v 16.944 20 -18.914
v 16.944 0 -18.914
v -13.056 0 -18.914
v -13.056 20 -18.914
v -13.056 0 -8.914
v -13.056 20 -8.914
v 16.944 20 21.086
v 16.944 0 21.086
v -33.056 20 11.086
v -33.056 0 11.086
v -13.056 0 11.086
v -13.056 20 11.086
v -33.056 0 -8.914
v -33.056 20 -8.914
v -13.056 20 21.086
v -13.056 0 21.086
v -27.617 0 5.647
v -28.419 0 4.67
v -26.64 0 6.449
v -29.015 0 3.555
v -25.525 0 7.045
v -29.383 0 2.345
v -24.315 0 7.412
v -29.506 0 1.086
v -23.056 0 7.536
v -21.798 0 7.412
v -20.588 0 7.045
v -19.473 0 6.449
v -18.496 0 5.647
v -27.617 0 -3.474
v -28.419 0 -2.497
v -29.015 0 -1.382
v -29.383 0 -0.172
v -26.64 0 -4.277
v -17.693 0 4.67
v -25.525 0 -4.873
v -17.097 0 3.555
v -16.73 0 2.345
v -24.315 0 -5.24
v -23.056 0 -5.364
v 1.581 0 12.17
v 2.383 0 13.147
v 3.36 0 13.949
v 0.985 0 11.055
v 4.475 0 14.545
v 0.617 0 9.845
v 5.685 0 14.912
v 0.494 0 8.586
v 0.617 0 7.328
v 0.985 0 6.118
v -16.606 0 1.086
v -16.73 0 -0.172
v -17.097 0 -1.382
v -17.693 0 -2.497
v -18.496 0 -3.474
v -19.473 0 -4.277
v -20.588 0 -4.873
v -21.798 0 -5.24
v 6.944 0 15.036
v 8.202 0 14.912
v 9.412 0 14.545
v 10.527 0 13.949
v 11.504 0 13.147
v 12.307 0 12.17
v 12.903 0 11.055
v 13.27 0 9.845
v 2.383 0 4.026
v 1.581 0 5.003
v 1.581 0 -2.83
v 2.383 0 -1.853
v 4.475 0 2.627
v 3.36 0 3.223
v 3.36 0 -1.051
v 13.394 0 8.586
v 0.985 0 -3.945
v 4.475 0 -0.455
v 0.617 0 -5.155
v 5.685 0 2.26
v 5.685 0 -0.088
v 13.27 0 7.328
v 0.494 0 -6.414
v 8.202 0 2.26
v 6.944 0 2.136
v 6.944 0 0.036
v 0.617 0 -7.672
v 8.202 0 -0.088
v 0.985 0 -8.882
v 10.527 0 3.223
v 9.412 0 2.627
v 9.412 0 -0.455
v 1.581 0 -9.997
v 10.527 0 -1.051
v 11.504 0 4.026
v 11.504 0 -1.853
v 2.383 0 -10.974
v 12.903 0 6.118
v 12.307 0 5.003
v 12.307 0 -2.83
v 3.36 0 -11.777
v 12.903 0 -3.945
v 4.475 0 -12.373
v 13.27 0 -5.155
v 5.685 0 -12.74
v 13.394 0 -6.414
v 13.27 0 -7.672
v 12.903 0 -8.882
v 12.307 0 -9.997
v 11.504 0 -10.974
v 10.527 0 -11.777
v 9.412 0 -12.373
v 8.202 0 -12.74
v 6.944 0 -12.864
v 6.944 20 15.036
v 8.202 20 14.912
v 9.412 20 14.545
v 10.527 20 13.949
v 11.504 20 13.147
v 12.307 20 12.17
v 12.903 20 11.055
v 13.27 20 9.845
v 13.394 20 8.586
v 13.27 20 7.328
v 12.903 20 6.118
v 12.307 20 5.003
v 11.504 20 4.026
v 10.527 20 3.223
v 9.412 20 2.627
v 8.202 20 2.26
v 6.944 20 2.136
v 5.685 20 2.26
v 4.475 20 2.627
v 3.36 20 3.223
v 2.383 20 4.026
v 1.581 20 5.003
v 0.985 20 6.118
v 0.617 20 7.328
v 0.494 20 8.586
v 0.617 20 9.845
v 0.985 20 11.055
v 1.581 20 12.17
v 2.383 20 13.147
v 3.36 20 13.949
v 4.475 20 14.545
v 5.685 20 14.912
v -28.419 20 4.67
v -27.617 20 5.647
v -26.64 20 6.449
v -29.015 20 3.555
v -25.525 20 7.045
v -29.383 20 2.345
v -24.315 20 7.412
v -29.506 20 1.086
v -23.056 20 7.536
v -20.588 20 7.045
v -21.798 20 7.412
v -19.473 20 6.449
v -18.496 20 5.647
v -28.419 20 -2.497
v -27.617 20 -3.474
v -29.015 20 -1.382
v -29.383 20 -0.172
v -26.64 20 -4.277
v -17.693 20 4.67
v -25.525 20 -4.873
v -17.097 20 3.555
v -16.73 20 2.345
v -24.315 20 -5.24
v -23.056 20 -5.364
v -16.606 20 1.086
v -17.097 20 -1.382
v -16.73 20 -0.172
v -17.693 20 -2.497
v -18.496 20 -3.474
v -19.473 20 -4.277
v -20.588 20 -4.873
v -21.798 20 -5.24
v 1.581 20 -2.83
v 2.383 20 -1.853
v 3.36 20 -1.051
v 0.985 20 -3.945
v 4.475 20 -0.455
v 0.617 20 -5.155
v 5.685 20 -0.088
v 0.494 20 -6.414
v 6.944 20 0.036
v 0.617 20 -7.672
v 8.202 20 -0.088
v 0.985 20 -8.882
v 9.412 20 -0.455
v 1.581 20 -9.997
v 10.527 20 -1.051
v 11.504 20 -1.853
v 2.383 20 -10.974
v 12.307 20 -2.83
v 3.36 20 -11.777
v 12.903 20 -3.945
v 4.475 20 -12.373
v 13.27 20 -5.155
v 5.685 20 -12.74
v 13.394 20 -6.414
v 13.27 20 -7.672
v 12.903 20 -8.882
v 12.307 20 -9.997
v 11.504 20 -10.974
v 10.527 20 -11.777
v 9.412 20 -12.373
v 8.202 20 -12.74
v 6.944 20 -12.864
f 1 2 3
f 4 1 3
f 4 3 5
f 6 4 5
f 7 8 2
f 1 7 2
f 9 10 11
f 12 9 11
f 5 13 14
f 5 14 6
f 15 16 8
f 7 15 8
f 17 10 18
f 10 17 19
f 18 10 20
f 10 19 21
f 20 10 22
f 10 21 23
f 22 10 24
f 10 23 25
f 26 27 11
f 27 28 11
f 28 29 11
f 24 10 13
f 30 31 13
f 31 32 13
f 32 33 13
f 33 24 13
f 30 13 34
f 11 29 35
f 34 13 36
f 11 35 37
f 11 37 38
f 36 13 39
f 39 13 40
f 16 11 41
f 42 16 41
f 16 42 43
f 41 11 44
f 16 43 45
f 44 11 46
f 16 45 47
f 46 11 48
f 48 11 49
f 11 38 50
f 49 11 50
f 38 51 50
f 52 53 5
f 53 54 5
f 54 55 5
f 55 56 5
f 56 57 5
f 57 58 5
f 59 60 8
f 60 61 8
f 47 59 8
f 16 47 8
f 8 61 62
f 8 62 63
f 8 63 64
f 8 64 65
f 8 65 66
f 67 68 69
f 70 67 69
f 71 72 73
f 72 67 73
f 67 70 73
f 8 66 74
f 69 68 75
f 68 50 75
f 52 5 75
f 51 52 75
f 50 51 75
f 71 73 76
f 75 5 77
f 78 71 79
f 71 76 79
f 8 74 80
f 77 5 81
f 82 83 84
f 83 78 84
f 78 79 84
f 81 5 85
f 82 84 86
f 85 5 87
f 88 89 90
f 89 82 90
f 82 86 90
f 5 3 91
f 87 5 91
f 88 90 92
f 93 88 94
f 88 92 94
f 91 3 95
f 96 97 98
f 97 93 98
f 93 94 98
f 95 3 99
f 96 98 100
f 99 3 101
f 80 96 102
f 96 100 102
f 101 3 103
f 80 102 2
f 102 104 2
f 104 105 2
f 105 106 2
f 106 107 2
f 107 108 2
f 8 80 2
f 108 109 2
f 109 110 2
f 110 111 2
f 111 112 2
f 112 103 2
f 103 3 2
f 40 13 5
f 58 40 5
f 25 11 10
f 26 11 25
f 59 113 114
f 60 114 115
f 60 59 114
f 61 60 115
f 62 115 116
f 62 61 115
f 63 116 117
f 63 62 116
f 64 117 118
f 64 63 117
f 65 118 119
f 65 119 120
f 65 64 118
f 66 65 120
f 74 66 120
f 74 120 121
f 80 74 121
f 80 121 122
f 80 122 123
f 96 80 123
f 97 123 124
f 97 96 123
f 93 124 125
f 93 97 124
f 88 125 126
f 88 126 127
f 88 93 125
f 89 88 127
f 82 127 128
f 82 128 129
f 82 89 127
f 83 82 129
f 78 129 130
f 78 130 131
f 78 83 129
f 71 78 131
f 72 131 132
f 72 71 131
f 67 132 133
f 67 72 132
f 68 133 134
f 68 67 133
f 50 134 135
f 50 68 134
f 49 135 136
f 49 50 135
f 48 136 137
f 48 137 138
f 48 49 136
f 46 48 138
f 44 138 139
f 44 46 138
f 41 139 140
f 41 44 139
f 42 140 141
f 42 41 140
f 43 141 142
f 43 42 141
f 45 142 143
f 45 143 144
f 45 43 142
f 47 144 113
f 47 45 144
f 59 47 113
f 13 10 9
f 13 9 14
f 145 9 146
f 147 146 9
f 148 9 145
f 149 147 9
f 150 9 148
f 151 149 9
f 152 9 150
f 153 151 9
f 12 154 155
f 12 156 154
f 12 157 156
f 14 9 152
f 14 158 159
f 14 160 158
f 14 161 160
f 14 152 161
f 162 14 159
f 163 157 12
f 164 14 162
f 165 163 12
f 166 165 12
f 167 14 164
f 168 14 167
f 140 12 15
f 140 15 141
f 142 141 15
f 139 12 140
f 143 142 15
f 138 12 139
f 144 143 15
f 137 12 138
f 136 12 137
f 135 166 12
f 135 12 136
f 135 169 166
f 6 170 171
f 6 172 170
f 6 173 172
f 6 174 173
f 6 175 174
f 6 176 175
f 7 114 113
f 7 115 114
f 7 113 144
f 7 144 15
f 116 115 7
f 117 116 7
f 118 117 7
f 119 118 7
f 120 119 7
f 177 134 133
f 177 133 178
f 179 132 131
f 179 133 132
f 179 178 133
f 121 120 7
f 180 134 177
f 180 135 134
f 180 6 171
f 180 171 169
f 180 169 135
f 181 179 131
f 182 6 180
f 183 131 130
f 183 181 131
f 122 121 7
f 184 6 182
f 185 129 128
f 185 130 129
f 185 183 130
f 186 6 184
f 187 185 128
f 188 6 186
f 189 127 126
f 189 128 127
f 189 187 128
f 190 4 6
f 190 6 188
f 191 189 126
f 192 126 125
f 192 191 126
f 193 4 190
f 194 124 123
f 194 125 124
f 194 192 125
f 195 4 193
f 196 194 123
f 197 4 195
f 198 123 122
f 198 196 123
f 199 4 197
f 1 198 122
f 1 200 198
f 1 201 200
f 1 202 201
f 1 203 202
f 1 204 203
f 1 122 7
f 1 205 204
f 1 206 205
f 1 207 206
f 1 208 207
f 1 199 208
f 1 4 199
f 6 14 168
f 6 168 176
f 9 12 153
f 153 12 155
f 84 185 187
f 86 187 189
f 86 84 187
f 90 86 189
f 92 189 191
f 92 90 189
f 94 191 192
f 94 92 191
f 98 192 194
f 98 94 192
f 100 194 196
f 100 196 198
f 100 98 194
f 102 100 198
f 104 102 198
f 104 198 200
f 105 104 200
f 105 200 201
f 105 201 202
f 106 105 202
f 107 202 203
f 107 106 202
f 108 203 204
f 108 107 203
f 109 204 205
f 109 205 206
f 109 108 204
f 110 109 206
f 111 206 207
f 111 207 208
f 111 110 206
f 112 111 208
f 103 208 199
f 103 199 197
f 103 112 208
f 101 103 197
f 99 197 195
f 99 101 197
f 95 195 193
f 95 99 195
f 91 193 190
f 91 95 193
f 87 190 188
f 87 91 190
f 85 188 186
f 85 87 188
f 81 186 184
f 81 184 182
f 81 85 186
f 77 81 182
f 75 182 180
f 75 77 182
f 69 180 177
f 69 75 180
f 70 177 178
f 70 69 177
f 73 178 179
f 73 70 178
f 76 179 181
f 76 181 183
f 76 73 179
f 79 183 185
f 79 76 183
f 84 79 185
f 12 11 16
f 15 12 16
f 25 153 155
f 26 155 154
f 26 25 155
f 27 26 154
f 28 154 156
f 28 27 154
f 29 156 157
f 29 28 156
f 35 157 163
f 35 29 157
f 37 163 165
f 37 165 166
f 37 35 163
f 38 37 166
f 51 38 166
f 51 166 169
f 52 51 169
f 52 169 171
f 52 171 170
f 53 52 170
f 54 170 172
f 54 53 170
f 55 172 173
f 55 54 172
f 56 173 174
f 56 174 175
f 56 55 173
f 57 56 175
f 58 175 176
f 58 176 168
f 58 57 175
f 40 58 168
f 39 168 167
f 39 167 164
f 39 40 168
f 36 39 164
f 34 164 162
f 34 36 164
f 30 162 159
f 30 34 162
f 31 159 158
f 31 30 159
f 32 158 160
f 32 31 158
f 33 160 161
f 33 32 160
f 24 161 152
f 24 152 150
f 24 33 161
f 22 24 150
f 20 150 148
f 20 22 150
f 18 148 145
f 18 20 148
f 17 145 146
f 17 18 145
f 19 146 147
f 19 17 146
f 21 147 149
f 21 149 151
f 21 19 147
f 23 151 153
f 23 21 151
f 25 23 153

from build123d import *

# Parameters (mm, degrees)
SKETCH1_R           = 6.45
SKETCH1_W           = 20
SKETCH1_H           = 20
BOSS_EXTRUDE1_DEPTH = 20


with BuildPart() as part:
    # Sketch1 → Boss-Extrude1 (new body)
    # profile 1 of 2: a face of its own
    with BuildSketch(Plane(origin=(0, 0, 0), x_dir=(1, 0, 0), z_dir=(0, 1, 0))):
        Polygon((-13.056470244, 18.913583857), (-13.056470244, 8.913583857), (-13.056470244, -11.086416143), (-13.056470244, -21.086416143), (16.943529756, -21.086416143), (16.943529756, 18.913583857), align=None)
        with Locations(Location((6.943529756, -8.586416143, 0), (0, 0, 270))):
            Circle(SKETCH1_R, mode=Mode.SUBTRACT)
        with Locations(Location((6.943529756, 6.413583857, 0), (0, 0, 270))):
            Circle(SKETCH1_R, mode=Mode.SUBTRACT)
    # profile 2 of 2: a face of its own
    with BuildSketch(Plane(origin=(0, 0, 0), x_dir=(1, 0, 0), z_dir=(0, 1, 0))):
        with Locations((-23.056470244, -1.086416143)):
            Rectangle(SKETCH1_W, SKETCH1_H)
        with Locations(Location((-23.056470244, -1.086416143, 0), (0, 0, 270))):
            Circle(SKETCH1_R, mode=Mode.SUBTRACT)
    extrude(amount=BOSS_EXTRUDE1_DEPTH)


solid = part.part
